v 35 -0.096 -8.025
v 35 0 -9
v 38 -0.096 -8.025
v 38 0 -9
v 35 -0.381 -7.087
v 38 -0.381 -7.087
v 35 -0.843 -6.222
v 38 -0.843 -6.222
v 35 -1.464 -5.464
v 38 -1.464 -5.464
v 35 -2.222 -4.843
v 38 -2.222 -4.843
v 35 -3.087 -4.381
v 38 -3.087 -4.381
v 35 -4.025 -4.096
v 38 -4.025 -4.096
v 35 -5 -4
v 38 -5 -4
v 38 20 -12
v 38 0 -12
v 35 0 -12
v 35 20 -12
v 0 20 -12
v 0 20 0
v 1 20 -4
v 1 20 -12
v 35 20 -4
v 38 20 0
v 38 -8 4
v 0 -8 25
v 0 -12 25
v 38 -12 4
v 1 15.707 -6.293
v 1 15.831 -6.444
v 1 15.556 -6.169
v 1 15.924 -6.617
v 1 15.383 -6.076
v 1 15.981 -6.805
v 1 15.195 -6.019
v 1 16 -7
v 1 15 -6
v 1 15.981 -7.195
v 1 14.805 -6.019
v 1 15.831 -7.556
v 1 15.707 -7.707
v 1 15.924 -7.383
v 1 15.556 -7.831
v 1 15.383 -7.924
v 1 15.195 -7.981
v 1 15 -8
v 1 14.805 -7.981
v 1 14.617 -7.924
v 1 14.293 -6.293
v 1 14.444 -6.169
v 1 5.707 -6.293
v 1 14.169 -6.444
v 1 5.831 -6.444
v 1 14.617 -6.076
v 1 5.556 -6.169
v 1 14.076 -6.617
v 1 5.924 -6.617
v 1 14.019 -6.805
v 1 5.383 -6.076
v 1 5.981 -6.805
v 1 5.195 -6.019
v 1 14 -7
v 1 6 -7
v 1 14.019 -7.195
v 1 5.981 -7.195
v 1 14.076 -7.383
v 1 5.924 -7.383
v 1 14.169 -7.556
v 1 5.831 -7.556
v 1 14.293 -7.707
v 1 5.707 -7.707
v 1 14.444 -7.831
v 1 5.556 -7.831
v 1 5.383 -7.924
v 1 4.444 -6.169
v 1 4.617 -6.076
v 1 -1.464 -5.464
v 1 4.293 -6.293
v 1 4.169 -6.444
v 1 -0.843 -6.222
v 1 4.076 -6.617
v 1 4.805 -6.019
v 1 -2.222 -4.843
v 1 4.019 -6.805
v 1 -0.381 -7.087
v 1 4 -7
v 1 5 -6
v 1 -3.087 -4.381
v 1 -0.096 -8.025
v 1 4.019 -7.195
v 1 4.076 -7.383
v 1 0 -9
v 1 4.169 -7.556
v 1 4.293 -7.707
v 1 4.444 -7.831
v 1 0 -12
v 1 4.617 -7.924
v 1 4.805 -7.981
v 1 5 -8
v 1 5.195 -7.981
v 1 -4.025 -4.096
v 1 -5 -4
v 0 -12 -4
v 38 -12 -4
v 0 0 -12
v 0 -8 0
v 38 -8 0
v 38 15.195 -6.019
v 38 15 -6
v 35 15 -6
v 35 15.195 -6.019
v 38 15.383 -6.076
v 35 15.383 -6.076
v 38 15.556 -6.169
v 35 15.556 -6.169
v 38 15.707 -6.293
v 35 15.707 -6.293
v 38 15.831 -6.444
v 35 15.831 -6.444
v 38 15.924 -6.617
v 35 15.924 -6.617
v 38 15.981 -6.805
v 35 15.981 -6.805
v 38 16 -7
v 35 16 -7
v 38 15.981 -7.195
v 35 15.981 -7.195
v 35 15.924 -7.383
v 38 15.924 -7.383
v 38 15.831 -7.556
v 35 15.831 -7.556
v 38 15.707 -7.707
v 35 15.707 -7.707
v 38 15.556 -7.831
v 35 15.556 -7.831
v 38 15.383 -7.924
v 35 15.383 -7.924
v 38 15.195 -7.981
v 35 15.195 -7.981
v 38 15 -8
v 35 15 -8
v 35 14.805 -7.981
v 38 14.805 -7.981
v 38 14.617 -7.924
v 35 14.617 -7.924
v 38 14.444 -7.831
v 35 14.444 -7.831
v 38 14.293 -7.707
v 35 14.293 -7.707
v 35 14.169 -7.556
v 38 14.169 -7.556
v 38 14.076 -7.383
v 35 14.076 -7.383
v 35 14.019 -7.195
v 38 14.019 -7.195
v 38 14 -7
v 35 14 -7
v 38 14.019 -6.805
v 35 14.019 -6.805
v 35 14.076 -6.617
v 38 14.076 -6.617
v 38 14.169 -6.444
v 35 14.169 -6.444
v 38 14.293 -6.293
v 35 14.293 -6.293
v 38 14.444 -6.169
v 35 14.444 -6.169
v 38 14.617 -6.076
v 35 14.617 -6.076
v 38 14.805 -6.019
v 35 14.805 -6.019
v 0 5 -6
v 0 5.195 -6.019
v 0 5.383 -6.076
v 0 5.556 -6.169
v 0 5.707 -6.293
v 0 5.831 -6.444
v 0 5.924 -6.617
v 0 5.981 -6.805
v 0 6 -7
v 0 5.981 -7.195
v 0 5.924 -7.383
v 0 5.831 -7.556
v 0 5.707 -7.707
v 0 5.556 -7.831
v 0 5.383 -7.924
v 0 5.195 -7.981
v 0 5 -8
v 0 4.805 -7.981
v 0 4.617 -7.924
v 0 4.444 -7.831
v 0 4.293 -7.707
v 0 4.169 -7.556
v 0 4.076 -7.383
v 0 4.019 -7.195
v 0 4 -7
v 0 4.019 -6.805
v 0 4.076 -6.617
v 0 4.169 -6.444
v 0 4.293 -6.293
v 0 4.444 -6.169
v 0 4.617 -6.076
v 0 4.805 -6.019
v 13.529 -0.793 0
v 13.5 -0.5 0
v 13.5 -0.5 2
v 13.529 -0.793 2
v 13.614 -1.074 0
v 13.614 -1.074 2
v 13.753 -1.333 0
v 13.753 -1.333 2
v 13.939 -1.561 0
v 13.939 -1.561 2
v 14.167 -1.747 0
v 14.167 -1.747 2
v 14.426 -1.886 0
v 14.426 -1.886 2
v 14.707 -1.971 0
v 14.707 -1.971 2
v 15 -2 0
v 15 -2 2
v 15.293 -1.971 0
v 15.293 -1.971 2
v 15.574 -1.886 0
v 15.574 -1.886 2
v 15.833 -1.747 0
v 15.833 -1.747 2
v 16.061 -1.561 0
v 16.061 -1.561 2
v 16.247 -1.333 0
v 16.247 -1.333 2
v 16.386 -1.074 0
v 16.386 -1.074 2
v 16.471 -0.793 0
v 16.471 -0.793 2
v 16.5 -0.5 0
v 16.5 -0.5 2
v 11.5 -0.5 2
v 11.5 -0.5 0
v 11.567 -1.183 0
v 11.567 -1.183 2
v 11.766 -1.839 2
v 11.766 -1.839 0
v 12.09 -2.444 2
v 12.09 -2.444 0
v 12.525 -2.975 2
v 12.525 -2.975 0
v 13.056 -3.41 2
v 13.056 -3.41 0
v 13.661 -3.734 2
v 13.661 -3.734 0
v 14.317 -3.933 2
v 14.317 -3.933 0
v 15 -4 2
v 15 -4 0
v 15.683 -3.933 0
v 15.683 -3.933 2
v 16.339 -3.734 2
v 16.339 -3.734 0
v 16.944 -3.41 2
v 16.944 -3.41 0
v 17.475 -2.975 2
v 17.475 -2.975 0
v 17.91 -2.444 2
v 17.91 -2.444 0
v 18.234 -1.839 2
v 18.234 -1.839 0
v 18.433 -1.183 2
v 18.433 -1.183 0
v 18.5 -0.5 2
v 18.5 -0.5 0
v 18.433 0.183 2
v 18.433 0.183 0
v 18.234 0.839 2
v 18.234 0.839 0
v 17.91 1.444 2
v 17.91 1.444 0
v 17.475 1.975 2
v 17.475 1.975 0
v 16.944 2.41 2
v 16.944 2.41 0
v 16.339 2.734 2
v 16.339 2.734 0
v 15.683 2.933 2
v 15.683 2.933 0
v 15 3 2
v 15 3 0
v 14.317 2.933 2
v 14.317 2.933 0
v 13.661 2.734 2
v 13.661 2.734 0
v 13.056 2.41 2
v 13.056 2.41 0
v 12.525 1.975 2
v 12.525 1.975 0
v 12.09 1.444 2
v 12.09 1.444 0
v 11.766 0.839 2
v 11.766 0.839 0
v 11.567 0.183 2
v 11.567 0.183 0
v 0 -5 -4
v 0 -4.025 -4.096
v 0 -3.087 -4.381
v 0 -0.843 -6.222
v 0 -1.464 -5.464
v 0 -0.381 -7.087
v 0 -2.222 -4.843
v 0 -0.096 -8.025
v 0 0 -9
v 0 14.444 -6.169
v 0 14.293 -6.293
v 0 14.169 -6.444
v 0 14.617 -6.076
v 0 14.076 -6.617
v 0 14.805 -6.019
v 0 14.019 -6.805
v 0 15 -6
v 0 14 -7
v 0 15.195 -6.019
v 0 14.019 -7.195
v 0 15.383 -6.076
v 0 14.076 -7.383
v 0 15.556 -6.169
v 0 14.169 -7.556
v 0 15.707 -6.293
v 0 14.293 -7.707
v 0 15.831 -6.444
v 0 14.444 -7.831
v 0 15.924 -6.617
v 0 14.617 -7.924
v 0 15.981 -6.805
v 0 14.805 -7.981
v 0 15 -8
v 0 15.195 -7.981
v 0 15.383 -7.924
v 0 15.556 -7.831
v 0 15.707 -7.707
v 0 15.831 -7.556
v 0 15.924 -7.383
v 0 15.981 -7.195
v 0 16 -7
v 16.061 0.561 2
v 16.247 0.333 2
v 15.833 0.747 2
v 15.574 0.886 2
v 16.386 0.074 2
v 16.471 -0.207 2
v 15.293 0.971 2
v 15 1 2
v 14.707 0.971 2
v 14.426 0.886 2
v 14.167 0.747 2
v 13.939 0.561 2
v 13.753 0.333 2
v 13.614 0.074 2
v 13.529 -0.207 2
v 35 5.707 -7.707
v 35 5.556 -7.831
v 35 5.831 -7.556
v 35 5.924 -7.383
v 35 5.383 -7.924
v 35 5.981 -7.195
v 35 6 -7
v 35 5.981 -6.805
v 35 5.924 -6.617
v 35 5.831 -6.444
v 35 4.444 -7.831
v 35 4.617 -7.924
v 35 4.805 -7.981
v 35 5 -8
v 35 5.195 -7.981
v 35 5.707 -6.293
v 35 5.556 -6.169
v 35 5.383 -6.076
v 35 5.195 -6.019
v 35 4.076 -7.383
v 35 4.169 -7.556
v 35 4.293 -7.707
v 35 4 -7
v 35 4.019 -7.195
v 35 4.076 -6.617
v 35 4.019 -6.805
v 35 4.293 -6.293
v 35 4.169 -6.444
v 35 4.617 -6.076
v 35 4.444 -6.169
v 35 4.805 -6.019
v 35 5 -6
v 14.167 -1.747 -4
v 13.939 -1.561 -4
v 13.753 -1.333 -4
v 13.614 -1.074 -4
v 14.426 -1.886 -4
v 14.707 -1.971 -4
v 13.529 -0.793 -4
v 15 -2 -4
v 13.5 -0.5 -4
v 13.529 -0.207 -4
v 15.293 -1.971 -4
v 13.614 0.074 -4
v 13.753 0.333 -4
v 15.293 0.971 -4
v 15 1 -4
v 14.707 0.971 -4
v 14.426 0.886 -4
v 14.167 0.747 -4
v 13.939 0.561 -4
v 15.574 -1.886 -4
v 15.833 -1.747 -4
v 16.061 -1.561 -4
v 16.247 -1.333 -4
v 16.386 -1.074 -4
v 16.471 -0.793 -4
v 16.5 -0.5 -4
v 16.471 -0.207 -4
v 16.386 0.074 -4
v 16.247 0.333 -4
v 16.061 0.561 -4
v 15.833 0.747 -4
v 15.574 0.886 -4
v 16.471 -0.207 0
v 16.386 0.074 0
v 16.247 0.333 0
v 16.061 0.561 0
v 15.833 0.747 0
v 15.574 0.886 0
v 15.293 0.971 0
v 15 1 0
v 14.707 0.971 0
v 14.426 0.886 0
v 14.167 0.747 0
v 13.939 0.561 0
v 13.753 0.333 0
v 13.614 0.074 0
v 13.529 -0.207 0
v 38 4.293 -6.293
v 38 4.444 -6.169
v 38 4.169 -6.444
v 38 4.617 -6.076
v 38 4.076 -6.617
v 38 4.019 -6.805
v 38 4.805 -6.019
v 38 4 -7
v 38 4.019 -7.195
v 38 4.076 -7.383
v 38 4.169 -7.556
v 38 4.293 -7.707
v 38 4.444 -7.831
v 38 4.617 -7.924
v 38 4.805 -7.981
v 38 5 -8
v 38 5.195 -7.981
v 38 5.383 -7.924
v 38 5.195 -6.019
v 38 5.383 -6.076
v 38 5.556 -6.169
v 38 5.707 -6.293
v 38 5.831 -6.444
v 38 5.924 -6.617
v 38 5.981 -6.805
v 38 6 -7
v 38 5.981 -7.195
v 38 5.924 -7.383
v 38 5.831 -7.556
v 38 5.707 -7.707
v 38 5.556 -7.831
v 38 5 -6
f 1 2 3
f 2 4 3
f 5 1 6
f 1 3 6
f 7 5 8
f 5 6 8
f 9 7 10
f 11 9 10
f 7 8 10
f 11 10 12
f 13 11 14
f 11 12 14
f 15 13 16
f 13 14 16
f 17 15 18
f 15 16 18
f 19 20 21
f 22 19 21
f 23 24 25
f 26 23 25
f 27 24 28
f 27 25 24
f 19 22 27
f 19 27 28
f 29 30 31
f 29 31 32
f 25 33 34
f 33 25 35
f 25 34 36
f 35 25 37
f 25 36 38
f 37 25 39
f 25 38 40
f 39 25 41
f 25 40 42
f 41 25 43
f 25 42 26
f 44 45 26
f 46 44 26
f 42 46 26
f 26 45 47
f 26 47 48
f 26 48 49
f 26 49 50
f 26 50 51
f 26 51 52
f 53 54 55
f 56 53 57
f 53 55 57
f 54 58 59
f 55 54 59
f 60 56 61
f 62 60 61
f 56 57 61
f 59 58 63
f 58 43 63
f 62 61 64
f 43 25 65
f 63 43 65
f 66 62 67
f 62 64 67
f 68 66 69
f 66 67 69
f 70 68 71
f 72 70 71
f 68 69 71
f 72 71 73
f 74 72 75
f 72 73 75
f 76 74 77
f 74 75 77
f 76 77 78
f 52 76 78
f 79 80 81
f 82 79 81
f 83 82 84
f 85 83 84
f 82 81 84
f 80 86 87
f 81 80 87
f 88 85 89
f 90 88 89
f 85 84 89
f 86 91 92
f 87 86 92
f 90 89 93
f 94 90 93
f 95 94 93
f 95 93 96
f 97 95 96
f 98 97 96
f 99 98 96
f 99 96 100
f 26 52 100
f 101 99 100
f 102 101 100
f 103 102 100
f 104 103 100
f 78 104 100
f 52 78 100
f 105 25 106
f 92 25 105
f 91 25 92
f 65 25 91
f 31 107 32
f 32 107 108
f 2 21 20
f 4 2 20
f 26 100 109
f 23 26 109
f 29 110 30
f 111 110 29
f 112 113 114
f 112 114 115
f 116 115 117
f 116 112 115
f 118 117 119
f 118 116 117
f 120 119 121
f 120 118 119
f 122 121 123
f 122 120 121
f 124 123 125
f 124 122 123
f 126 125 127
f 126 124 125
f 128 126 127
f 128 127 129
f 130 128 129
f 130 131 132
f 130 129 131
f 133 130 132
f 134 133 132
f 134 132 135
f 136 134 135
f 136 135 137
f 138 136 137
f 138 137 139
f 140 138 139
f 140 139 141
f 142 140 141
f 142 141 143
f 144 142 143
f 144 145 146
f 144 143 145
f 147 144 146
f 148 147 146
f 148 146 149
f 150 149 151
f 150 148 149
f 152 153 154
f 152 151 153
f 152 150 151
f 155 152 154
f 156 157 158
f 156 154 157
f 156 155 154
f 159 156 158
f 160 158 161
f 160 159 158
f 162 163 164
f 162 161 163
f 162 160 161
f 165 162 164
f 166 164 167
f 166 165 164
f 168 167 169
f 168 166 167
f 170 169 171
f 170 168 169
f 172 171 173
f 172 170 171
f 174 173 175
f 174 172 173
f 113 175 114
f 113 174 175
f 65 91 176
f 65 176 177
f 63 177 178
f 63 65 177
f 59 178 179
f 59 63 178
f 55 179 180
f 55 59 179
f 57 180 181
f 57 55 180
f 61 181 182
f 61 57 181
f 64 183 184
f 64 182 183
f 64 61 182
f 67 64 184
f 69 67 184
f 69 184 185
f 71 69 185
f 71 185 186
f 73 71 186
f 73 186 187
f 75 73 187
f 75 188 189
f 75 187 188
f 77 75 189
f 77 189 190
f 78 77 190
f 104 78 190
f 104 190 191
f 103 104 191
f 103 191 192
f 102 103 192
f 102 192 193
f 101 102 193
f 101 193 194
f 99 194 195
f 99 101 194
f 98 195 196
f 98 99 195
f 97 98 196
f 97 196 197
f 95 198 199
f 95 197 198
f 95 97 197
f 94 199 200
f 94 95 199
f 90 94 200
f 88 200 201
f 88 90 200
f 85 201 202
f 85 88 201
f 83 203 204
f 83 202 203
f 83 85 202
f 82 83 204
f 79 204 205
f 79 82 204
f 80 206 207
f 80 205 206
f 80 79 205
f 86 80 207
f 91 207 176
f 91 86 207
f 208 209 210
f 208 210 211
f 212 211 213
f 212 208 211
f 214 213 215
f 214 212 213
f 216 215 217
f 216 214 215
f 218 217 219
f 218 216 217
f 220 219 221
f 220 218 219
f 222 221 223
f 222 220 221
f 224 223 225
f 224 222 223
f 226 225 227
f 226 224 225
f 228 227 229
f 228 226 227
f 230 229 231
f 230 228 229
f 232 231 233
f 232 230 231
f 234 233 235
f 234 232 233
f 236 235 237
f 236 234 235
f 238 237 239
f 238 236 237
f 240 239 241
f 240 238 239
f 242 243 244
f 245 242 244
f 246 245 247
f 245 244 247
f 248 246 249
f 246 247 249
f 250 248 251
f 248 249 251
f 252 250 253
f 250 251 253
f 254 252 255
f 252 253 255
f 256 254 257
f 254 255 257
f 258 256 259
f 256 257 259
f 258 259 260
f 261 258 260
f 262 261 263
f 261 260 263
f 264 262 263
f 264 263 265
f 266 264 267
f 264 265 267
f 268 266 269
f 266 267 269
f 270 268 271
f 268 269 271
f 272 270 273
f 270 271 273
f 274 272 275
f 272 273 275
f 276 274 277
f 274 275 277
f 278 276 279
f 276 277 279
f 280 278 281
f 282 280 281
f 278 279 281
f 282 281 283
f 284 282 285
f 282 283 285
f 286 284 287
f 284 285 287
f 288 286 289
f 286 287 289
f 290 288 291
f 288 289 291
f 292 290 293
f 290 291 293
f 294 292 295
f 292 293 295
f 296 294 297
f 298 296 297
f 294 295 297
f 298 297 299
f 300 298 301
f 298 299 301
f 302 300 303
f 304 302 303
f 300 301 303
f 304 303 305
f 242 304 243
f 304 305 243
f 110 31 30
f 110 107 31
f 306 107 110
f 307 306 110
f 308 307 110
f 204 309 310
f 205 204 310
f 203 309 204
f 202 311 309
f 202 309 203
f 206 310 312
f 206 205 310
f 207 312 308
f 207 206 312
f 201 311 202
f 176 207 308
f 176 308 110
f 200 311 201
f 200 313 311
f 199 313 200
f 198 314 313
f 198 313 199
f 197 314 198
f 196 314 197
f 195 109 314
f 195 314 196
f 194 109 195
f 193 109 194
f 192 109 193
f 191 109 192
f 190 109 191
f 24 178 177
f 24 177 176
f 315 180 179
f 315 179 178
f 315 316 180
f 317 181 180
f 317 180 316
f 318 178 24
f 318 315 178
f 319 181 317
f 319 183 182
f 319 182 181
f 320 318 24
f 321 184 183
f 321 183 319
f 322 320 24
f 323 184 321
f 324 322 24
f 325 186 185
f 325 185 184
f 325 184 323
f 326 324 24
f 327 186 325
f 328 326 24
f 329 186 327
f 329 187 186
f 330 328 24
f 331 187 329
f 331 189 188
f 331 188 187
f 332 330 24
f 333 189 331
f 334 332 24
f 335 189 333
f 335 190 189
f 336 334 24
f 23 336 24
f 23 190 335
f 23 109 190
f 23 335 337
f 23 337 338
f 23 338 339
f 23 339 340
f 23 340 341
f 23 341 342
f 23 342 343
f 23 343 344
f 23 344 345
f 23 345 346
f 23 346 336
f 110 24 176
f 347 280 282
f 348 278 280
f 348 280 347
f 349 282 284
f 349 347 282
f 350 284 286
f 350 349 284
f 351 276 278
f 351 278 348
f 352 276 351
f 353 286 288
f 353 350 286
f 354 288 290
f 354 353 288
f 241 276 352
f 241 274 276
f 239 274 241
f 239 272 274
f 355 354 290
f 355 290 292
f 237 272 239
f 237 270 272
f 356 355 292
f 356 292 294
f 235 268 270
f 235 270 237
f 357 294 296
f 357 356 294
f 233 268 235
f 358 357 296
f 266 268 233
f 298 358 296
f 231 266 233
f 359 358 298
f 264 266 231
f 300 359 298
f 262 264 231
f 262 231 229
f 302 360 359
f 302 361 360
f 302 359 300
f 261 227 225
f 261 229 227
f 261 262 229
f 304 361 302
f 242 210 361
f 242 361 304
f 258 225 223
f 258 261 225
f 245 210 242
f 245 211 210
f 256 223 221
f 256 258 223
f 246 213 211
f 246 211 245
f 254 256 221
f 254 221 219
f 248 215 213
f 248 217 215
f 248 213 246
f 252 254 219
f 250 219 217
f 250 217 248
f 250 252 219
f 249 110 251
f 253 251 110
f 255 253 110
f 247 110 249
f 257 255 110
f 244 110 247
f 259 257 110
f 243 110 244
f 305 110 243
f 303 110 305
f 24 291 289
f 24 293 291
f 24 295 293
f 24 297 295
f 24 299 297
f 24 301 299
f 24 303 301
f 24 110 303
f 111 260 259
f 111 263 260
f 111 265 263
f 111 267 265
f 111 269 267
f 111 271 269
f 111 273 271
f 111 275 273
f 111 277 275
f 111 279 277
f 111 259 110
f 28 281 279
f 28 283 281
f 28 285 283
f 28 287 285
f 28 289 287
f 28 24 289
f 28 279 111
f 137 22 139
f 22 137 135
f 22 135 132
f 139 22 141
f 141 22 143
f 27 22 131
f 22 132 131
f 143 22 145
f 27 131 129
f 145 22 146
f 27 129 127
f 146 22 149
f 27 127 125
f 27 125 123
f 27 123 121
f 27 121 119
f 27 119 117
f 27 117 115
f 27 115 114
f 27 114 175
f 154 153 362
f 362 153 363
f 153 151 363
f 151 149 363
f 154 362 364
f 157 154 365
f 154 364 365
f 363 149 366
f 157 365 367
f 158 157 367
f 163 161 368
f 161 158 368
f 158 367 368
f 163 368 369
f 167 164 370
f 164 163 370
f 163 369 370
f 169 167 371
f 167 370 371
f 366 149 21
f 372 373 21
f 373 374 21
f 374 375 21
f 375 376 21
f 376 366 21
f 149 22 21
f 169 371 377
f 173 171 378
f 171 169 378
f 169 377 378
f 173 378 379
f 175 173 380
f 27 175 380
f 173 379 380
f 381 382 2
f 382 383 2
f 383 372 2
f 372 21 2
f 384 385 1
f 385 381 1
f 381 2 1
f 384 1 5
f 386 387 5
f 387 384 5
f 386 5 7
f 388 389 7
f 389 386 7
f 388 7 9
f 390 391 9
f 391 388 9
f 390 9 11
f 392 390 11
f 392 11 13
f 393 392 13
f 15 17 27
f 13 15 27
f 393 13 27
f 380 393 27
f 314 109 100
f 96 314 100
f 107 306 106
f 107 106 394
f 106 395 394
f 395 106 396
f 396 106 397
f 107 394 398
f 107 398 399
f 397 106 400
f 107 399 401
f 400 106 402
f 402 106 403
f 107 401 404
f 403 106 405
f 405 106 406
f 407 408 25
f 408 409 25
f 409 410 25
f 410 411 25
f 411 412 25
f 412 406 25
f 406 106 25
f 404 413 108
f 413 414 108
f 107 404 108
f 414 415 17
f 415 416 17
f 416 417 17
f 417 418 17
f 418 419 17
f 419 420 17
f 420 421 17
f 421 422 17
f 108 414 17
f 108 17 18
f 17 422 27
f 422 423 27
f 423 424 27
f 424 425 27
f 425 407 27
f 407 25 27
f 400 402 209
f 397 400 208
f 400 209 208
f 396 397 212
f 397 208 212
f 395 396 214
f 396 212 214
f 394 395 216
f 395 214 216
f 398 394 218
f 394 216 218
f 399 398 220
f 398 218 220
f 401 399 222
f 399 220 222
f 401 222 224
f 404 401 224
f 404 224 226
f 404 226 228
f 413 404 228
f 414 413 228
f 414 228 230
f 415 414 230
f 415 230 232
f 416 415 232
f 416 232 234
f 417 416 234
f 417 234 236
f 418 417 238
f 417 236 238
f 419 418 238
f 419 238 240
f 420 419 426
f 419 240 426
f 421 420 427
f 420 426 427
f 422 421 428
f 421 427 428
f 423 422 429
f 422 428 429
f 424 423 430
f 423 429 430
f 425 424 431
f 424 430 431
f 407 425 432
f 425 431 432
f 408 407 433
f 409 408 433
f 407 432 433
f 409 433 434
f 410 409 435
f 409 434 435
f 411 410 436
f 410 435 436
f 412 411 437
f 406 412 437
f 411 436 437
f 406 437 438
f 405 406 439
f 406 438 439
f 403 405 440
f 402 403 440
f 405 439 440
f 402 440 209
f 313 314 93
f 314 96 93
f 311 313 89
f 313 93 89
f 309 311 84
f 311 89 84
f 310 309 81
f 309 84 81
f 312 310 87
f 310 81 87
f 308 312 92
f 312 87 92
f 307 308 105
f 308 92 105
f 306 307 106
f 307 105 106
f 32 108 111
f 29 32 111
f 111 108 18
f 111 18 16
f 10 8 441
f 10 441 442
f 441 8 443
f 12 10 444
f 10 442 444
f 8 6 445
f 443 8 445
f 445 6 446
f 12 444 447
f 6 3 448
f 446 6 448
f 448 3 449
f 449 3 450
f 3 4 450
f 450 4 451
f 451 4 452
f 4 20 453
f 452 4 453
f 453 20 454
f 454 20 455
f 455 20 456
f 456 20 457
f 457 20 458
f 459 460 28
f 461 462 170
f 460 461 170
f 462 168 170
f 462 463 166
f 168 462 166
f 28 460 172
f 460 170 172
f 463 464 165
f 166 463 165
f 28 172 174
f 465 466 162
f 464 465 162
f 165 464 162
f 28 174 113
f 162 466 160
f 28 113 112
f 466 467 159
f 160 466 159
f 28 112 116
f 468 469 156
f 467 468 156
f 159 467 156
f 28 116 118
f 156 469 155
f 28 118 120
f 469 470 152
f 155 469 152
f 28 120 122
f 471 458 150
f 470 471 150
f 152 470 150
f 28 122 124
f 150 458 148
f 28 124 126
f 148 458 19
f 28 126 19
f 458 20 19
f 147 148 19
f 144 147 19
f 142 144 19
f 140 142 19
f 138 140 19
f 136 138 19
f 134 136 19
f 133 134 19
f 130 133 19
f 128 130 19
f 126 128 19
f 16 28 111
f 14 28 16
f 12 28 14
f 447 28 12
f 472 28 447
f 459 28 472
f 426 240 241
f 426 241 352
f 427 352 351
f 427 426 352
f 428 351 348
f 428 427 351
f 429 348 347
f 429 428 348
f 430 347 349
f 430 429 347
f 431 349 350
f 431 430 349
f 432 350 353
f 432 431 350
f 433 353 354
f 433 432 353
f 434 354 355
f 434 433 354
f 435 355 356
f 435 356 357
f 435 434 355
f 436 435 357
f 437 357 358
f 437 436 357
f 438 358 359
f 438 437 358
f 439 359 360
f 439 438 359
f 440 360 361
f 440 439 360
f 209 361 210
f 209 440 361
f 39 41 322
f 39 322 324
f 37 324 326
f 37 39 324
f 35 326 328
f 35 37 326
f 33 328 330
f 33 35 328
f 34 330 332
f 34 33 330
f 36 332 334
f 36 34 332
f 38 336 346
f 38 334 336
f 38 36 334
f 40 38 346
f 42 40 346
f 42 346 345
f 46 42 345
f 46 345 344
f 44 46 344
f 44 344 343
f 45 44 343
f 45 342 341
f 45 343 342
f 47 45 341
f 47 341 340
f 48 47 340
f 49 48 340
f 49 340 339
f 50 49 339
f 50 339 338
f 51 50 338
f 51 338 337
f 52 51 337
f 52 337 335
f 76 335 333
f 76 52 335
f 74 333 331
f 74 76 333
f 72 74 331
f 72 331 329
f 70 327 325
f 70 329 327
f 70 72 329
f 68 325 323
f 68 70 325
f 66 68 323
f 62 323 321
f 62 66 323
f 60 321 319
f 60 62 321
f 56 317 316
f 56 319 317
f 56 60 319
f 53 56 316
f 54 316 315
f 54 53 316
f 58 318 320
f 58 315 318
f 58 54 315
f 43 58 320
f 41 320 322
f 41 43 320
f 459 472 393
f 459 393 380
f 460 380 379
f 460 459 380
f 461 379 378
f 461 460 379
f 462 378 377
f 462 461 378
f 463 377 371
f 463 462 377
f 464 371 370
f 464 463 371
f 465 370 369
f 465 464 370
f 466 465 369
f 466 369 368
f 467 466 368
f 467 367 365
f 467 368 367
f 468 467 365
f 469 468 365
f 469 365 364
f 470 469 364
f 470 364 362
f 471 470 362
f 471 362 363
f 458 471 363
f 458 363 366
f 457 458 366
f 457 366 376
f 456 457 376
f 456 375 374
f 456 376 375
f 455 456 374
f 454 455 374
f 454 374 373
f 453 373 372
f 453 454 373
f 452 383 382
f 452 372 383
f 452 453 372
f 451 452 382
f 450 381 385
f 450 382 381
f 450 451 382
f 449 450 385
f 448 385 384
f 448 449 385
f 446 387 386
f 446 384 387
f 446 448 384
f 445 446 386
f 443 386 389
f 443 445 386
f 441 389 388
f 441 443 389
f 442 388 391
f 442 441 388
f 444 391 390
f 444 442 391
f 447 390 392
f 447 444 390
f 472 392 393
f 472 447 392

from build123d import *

# Parameters (mm, degrees)
BOSS_EXTRUDE1_DEPTH     = 20
SKETCH2_W               = 38
SKETCH2_H               = 4
BOSS_EXTRUDE2_DEPTH     = 12
FILLET1_R               = 5
SKETCH3_W               = 38
SKETCH3_H               = 4
BOSS_EXTRUDE3_DEPTH     = 25
SKETCH4_R               = 3.5
SKETCH4_R_2             = 1.5
BOSS_EXTRUDE4_DEPTH     = 2
SKETCH5_R               = 1.5
CUT_EXTRUDE1_DEPTH      = 49.713447835
CUT_EXTRUDE2_DEPTH      = 10
CUT_EXTRUDE3_DEPTH      = 50.689032995
CUT_EXTRUDE3_DEPTH_BACK = 50.689032995
SKETCH7_R               = 1


with BuildPart() as part:
    # Sketch1 → Boss-Extrude1 (new body)
    with BuildSketch(Plane(origin=(0, 0, 0), x_dir=(1, 0, 0), z_dir=(0, 1, 0))):
        Polygon((0, 12), (0, 0), (38, 0), (38, 12), (35, 12), (35, 4), (1, 4), (1, 12), align=None)
    extrude(amount=BOSS_EXTRUDE1_DEPTH)

    # Sketch2 → Boss-Extrude2 (add)
    with BuildSketch(Plane.XZ):
        with Locations((19, -2)):
            Rectangle(SKETCH2_W, SKETCH2_H)
    extrude(amount=BOSS_EXTRUDE2_DEPTH)

    # Fillet1
    fillet1_edges = [part.edges().sort_by_distance(p)[0] for p in [
        (36.5, 0, -4),
        (0.5, 0, -4),
    ]]
    fillet(fillet1_edges, radius=FILLET1_R)

    # Sketch3 → Boss-Extrude3 (add)
    with BuildSketch(Plane.XY):
        with Locations((19, -10)):
            Rectangle(SKETCH3_W, SKETCH3_H)
    extrude(amount=BOSS_EXTRUDE3_DEPTH)

    # Sketch4 → Boss-Extrude4 (add)
    with BuildSketch(Plane.XY):
        with Locations(Location((15, -0.5, 0), (0, 0, 180))):
            Circle(SKETCH4_R)
        with Locations((15, -0.5)):
            Circle(SKETCH4_R_2, mode=Mode.SUBTRACT)
    extrude(amount=BOSS_EXTRUDE4_DEPTH)

    # Sketch5 → Cut-Extrude1 (cut, through all)
    with BuildSketch(Plane.XY.offset(2)):
        with Locations(Location((15, -0.5, 0), (0, 0, 180))):
            Circle(SKETCH5_R)
    extrude(amount=-CUT_EXTRUDE1_DEPTH, mode=Mode.SUBTRACT)

    # Sketch6 → Cut-Extrude2 (cut)
    with BuildSketch(Plane(origin=(0, -8, 0), x_dir=(1, 0, 0), z_dir=(0, 1, 0))):
        Polygon((0, -25), (38, -4), (38, -25), align=None)
    extrude(amount=-CUT_EXTRUDE2_DEPTH, mode=Mode.SUBTRACT)

    # Sketch7 → Cut-Extrude3 (cut, two sides: drawn at the far end of the back side and taken through both)
    with BuildSketch(Plane.ZY.offset(-CUT_EXTRUDE3_DEPTH_BACK)):
        with Locations((-7, 15)):
            Circle(SKETCH7_R)
        with Locations((-7, 5)):
            Circle(SKETCH7_R)
    extrude(amount=CUT_EXTRUDE3_DEPTH + CUT_EXTRUDE3_DEPTH_BACK, mode=Mode.SUBTRACT)


solid = part.part
